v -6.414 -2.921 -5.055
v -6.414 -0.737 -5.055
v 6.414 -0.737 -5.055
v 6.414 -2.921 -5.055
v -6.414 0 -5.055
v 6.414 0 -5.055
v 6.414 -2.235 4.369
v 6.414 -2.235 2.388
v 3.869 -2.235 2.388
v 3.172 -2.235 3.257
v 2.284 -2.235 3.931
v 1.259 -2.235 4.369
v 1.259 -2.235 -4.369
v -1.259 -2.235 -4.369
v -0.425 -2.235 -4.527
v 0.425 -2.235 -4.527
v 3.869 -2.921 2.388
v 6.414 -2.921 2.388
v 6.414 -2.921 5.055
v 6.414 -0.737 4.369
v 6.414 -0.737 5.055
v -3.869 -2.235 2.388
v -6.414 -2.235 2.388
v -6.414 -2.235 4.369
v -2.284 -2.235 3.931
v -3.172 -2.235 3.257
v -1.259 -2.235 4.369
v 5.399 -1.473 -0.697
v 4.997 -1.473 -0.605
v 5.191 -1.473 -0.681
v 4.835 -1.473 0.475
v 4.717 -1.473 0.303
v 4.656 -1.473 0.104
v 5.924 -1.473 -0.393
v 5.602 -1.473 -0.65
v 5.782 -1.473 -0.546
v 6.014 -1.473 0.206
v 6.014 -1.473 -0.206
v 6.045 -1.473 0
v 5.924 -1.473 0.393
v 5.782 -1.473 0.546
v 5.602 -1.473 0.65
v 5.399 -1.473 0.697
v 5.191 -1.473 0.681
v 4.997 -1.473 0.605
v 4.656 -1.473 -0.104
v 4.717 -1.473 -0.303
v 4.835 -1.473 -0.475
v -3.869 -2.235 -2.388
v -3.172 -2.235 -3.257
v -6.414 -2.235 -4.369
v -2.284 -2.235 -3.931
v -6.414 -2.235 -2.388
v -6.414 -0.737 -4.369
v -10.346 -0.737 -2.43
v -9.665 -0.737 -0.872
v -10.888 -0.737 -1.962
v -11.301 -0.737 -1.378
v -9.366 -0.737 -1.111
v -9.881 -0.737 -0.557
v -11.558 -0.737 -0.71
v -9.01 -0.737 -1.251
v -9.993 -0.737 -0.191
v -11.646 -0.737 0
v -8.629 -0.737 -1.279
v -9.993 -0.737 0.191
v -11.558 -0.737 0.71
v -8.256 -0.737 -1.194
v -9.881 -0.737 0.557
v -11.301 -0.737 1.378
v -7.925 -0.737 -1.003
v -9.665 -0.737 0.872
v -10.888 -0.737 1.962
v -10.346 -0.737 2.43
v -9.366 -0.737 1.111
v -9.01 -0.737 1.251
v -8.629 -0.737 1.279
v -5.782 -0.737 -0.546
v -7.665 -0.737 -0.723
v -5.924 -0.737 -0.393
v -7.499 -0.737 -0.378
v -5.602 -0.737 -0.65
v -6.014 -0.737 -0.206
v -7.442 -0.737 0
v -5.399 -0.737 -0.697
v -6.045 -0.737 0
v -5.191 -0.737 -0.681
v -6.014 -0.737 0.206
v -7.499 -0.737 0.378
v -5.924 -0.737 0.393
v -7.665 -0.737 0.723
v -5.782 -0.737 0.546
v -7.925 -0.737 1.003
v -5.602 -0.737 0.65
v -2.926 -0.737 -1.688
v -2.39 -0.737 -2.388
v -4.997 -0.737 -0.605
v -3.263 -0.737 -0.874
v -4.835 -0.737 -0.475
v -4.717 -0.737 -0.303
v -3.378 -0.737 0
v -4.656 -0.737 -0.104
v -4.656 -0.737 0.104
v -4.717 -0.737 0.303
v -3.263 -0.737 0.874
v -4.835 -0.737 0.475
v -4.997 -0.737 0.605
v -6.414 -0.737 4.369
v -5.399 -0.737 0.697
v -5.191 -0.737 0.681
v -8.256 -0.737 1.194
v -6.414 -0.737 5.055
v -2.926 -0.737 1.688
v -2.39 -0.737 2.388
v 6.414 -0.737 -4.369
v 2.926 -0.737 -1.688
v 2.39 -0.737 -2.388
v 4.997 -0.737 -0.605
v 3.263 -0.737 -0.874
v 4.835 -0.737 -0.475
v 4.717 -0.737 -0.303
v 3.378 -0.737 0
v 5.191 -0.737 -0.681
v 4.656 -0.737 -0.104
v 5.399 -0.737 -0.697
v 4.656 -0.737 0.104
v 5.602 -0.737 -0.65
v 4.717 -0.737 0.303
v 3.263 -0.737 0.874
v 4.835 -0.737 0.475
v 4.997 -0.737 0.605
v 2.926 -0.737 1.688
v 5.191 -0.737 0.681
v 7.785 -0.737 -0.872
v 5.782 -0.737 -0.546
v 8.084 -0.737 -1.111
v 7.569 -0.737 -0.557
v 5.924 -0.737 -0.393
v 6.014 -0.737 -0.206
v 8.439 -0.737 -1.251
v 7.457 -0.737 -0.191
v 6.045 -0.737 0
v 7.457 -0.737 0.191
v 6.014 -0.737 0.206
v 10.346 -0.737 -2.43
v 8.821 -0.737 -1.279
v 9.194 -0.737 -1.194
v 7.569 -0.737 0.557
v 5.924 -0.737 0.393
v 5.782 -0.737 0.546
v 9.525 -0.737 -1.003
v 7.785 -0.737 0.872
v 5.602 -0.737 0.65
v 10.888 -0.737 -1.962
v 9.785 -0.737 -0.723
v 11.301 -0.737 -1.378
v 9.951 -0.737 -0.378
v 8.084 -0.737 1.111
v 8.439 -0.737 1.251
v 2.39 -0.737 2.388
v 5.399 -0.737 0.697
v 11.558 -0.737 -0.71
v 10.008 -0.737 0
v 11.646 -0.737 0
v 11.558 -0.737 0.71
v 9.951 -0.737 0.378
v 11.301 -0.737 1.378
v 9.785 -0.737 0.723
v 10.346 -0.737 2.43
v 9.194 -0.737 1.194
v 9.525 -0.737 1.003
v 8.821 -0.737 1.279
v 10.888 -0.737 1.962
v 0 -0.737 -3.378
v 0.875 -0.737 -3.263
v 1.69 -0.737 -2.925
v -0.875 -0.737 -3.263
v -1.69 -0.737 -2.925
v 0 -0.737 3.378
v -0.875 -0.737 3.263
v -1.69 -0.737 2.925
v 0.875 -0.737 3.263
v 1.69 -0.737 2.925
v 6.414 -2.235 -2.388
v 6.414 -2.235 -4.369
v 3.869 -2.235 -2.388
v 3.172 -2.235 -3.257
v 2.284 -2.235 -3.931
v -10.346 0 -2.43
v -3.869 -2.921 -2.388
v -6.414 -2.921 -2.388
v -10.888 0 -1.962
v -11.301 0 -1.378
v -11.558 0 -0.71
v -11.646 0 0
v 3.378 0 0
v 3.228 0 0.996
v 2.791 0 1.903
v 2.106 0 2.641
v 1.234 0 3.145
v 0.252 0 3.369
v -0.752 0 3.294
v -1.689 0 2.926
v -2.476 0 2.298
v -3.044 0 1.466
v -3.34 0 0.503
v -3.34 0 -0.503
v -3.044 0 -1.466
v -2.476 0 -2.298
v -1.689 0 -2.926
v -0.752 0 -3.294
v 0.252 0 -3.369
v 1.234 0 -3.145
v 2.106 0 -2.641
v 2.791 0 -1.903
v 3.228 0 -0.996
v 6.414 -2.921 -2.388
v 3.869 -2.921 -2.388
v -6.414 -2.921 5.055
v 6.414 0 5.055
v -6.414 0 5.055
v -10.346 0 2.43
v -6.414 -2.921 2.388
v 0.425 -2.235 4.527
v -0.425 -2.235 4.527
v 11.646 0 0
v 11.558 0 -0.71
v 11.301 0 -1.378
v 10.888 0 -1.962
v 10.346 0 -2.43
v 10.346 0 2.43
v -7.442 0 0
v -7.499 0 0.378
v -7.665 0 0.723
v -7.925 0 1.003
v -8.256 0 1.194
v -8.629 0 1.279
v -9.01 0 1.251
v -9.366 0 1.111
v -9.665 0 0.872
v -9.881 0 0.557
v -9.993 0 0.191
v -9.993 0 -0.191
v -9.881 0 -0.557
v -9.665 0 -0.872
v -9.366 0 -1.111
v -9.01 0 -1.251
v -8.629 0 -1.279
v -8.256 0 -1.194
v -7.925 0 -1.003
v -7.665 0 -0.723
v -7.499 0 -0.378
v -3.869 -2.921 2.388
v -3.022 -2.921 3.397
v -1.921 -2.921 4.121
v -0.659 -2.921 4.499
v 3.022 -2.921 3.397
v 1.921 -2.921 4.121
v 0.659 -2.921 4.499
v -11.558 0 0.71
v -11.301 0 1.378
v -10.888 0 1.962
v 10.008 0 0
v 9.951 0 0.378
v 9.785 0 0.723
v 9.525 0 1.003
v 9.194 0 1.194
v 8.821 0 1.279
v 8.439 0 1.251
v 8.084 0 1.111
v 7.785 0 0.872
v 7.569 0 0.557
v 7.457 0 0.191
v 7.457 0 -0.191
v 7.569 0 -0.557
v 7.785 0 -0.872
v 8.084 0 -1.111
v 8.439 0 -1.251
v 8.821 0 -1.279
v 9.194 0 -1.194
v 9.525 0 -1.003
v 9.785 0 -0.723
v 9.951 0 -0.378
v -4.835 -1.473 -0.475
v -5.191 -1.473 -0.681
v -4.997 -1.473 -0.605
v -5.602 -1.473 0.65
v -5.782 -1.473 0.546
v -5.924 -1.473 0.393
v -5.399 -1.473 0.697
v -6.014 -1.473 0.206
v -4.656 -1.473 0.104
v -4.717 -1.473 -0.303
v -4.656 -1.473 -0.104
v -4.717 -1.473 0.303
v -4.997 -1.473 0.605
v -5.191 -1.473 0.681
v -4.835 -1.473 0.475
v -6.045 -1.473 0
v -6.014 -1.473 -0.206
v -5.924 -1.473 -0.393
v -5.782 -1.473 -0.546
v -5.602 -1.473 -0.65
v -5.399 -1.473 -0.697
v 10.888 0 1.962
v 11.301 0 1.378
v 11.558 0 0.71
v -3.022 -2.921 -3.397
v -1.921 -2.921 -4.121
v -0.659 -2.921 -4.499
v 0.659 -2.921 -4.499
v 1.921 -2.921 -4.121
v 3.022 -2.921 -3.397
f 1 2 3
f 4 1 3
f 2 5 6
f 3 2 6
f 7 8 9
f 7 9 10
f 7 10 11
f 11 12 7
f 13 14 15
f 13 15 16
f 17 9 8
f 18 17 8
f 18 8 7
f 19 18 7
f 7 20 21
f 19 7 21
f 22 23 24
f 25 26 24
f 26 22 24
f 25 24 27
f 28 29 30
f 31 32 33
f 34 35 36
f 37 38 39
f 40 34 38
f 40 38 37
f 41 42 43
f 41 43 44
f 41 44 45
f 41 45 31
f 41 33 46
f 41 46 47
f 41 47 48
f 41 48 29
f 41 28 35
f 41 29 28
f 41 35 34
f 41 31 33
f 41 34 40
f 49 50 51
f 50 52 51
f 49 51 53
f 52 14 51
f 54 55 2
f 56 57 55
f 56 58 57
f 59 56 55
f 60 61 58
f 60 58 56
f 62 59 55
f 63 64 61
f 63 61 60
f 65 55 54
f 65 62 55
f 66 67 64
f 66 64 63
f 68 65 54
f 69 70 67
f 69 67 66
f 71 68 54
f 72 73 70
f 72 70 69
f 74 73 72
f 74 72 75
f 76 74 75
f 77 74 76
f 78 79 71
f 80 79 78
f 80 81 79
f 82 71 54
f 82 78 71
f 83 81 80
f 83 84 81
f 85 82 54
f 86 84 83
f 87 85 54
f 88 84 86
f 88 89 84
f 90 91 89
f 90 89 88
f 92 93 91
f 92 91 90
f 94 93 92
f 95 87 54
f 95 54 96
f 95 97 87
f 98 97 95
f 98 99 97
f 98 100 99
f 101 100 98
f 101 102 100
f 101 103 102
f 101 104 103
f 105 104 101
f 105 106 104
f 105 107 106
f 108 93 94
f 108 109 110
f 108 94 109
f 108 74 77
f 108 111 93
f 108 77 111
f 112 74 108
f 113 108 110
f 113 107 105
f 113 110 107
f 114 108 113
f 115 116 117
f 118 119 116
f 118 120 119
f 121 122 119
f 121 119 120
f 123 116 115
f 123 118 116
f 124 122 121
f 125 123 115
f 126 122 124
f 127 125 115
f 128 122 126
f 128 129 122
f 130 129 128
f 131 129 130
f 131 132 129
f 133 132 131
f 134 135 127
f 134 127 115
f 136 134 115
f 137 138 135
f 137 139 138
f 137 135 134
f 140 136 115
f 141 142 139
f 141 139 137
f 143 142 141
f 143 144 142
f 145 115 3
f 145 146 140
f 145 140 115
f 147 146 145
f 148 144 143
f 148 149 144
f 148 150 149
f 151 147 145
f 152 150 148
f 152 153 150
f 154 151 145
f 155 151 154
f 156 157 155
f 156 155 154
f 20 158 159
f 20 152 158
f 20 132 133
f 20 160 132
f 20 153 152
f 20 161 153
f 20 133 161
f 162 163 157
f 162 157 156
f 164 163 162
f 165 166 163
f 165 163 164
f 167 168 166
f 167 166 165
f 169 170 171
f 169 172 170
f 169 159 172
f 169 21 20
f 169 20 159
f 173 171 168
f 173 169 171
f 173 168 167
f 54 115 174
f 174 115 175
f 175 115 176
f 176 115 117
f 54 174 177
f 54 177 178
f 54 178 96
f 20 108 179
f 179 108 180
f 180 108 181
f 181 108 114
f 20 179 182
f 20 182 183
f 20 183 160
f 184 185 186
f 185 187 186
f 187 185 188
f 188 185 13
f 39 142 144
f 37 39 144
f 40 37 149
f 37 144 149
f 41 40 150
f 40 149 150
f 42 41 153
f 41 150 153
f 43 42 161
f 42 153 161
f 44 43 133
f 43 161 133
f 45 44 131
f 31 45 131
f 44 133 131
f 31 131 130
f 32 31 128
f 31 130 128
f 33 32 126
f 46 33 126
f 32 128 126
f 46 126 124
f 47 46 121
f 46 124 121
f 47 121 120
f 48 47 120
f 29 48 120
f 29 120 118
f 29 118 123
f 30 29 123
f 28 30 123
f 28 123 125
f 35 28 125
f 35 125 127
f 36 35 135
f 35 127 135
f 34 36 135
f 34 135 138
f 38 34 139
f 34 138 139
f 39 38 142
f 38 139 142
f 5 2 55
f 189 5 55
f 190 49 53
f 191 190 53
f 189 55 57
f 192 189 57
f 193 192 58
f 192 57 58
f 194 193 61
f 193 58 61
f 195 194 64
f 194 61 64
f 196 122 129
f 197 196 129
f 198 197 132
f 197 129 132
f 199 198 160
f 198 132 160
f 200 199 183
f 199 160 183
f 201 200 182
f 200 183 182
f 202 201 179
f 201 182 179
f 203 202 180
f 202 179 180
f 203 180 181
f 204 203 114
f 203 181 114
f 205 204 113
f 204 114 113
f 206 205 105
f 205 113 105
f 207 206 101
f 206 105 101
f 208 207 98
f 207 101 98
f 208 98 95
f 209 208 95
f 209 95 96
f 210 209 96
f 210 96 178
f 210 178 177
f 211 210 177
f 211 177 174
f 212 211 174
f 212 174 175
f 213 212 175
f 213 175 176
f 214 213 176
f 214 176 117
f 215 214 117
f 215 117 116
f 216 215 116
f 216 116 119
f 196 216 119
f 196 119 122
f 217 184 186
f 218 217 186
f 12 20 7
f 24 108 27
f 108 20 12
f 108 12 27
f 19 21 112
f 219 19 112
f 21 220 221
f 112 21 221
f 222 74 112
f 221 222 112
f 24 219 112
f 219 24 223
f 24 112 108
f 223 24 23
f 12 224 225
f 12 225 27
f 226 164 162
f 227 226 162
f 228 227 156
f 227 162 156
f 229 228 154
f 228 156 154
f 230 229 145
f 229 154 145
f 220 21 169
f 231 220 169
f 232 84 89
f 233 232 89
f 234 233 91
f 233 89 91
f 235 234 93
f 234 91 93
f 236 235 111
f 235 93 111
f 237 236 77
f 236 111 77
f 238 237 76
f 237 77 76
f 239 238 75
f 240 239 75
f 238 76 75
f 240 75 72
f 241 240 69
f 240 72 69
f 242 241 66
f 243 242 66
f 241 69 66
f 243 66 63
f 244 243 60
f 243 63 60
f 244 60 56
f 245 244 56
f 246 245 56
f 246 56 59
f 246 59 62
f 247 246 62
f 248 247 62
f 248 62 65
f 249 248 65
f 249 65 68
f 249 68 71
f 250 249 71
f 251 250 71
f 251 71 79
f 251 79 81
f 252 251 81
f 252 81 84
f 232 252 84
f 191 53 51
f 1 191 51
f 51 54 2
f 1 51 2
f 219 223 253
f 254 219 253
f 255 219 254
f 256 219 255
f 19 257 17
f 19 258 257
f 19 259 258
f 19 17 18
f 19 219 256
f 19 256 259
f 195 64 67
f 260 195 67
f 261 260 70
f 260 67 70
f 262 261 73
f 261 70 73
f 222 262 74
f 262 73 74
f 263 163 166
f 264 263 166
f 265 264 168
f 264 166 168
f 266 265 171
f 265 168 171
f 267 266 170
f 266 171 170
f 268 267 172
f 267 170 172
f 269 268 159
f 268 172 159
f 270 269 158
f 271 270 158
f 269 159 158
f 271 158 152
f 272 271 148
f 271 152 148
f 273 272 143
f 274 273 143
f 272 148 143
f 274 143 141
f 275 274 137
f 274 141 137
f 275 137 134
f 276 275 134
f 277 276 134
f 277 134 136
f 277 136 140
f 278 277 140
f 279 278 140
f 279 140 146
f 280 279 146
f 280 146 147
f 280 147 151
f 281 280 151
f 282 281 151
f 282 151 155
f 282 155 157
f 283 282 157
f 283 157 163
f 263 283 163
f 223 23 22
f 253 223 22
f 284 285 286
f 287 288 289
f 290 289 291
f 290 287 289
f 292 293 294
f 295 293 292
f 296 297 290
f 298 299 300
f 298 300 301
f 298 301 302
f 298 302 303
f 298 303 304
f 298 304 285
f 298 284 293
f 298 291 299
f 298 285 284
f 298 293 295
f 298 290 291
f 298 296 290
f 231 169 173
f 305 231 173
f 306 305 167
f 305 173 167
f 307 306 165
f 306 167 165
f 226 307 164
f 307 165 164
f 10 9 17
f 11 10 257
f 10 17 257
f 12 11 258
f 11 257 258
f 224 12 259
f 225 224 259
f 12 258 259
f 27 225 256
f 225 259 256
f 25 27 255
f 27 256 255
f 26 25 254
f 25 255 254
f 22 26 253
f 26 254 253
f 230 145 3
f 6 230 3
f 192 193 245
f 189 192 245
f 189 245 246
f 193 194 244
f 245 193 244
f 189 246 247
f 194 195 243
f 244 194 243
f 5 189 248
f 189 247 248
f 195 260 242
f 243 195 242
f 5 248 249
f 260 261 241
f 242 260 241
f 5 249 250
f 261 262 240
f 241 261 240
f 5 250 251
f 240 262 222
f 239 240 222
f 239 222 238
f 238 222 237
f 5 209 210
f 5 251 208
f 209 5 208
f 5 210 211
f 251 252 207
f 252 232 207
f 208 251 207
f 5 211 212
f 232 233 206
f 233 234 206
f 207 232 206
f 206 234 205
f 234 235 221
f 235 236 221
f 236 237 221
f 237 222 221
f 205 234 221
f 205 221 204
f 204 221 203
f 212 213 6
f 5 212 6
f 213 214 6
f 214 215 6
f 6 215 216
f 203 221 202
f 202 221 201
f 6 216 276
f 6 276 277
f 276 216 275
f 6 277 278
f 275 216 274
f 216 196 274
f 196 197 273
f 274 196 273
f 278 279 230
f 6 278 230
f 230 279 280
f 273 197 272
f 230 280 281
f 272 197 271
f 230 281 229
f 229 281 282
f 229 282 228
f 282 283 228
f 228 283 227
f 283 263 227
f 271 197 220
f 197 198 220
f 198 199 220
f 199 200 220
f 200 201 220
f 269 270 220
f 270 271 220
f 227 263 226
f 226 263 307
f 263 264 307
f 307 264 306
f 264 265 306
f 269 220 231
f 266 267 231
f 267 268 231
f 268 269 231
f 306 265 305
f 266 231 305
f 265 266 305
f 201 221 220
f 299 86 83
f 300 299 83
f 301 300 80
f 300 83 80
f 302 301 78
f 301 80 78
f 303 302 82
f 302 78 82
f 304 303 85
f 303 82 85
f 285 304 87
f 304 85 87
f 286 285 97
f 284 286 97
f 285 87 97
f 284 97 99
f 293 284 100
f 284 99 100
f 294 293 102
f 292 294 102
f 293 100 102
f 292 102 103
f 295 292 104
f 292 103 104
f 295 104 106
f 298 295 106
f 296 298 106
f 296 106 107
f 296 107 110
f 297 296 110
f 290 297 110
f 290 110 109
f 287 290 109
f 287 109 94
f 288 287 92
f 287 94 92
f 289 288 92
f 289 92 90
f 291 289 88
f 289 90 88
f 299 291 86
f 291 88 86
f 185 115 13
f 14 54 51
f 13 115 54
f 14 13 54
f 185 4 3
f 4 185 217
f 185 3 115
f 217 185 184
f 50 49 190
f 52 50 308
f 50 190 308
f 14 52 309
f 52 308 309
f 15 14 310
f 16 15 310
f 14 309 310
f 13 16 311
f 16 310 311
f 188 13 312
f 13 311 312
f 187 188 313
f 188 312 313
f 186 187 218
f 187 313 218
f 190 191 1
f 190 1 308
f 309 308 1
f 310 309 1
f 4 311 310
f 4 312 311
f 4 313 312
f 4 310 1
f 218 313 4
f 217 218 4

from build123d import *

# Parameters (mm, degrees)
F0_W      = 23.2918
F0_H      = 10.1092
F1_DEPTH  = 0.7366
F3_DEPTH  = 25.4
F4_R      = 1.2827
F4_R_2    = 3.3782
F5_DEPTH  = 0.7376
F6_R      = 0.6985
F7_DEPTH  = 0.7366
F9_DEPTH  = 2.1844
F10_W     = 1.4986
F10_H     = 1.9812
F11_DEPTH = 18.0604
F12_W     = 1.4986
F12_H     = 1.9812
F13_DEPTH = 18.0604
F15_DEPTH = 0.6858
F17_DEPTH = 0.6858


with BuildPart() as f1:
    # F0 (on Front) → F1 (new body)
    with BuildSketch(Plane.XZ):
        Rectangle(F0_W, F0_H)
    extrude(amount=F1_DEPTH)

    # F2 (on face) → F3 (cut)
    with BuildSketch(Plane.XZ.offset(0.7366)):
        with BuildLine():
            Line((-10.3464885777, 2.4295455305), (-6.4135, 5.0546))
            Line((-6.4135, 5.0546), (-11.6459, 5.0546))
            Line((-11.6459, 5.0546), (-11.6459, 0))
            ThreePointArc((-11.6459, 0), (-11.3006427313, 1.3776031295), (-10.3464885777, 2.4295455305))
        make_face()
        with BuildLine():
            Line((-11.6459, -5.0546), (-6.4135, -5.0546))
            Line((-6.4135, -5.0546), (-10.3464885777, -2.4295455305))
            ThreePointArc((-10.3464885777, -2.4295455305), (-11.3006427313, -1.3776031295), (-11.6459, 0))
            Line((-11.6459, 0), (-11.6459, -5.0546))
        make_face()
        with BuildLine():
            ThreePointArc((11.6459, 0), (11.3006427313, -1.3776031295), (10.3464885777, -2.4295455305))
            Line((10.3464885777, -2.4295455305), (6.4135, -5.0546))
            Line((6.4135, -5.0546), (11.6459, -5.0546))
            Line((11.6459, -5.0546), (11.6459, 0))
        make_face()
        with BuildLine():
            ThreePointArc((10.3464885777, 2.4295455305), (11.3006427313, 1.3776031295), (11.6459, 0))
            Line((11.6459, 0), (11.6459, 5.0546))
            Line((11.6459, 5.0546), (6.4135, 5.0546))
            Line((6.4135, 5.0546), (10.3464885777, 2.4295455305))
        make_face()
    extrude(amount=-F3_DEPTH, mode=Mode.SUBTRACT)

    # F4 (on face) → F5 (cut, through all)
    with BuildSketch(Plane.XZ.offset(0.7366)):
        with Locations((-8.7249, 0)):
            Circle(F4_R)
        Circle(F4_R_2)
        with Locations((8.7249, 0)):
            Circle(F4_R)
    extrude(amount=-F5_DEPTH, mode=Mode.SUBTRACT)

    # F6 (on face) → F7 (join)
    with BuildSketch(Plane.XZ.offset(0.7366)):
        with BuildLine():
            ThreePointArc((-4.6482, 0), (-5.3467, 0.6985), (-6.0452, 0))
            ThreePointArc((-6.0452, 0), (-5.3467, -0.6985), (-4.6482, 0))
        make_face()
        with Locations((5.3467, 0)):
            Circle(F6_R)
    extrude(amount=F7_DEPTH)

    # F8 (on face) → F9 (join)
    with BuildSketch(Plane.XZ.offset(0.7366)):
        with BuildLine():
            Line((-6.4135, 2.3876), (-2.3898957048, 2.3876))
            ThreePointArc((-2.3898957048, 2.3876), (0, 3.3782), (2.3898957048, 2.3876))
            Line((2.3898957048, 2.3876), (6.4135, 2.3876))
            Line((6.4135, 2.3876), (6.4135, 5.0546))
            Line((6.4135, 5.0546), (-6.4135, 5.0546))
            Line((-6.4135, 5.0546), (-6.4135, 2.3876))
        make_face()
        with BuildLine():
            Line((-6.4135, -2.3876), (-6.4135, -5.0546))
            Line((-6.4135, -5.0546), (6.4135, -5.0546))
            Line((6.4135, -5.0546), (6.4135, -2.3876))
            Line((6.4135, -2.3876), (2.3898957048, -2.3876))
            ThreePointArc((2.3898957048, -2.3876), (0, -3.3782), (-2.3898957048, -2.3876))
            Line((-2.3898957048, -2.3876), (-6.4135, -2.3876))
        make_face()
    extrude(amount=F9_DEPTH)

    # F10 (on face) → F11 (cut, through all)
    with BuildSketch(Plane(origin=(-6.4135, 0, 0), x_dir=(0, -1, 0), z_dir=(-1, 0, 0))):
        with Locations((1.4859, 3.3782)):
            Rectangle(F10_W, F10_H)
    extrude(amount=-F11_DEPTH, mode=Mode.SUBTRACT)

    # F12 (on face) → F13 (cut, through all)
    with BuildSketch(Plane(origin=(-6.4135, 0, 0), x_dir=(0, -1, 0), z_dir=(-1, 0, 0))):
        with Locations((1.4859, -3.3782)):
            Rectangle(F12_W, F12_H)
    extrude(amount=-F13_DEPTH, mode=Mode.SUBTRACT)

    # F14 (on face) → F15 (cut)
    with BuildSketch(Plane.XZ.offset(2.921)):
        with BuildLine():
            Line((2.3898957048, 2.3876), (3.8692296132, 2.3876))
            ThreePointArc((3.8692296132, 2.3876), (0, 4.5466), (-3.8692296132, 2.3876))
            Line((-3.8692296132, 2.3876), (-2.3898957048, 2.3876))
            ThreePointArc((-2.3898957048, 2.3876), (0, 3.3782), (2.3898957048, 2.3876))
        make_face()
    extrude(amount=-F15_DEPTH, mode=Mode.SUBTRACT)

    # F16 (on face) → F17 (cut)
    with BuildSketch(Plane.XZ.offset(2.921)):
        with BuildLine():
            Line((-2.3898957048, -2.3876), (-3.8692296132, -2.3876))
            ThreePointArc((-3.8692296132, -2.3876), (0, -4.5466), (3.8692296132, -2.3876))
            Line((3.8692296132, -2.3876), (2.3898957048, -2.3876))
            ThreePointArc((2.3898957048, -2.3876), (0, -3.3782), (-2.3898957048, -2.3876))
        make_face()
    extrude(amount=-F17_DEPTH, mode=Mode.SUBTRACT)


solid = f1.part
